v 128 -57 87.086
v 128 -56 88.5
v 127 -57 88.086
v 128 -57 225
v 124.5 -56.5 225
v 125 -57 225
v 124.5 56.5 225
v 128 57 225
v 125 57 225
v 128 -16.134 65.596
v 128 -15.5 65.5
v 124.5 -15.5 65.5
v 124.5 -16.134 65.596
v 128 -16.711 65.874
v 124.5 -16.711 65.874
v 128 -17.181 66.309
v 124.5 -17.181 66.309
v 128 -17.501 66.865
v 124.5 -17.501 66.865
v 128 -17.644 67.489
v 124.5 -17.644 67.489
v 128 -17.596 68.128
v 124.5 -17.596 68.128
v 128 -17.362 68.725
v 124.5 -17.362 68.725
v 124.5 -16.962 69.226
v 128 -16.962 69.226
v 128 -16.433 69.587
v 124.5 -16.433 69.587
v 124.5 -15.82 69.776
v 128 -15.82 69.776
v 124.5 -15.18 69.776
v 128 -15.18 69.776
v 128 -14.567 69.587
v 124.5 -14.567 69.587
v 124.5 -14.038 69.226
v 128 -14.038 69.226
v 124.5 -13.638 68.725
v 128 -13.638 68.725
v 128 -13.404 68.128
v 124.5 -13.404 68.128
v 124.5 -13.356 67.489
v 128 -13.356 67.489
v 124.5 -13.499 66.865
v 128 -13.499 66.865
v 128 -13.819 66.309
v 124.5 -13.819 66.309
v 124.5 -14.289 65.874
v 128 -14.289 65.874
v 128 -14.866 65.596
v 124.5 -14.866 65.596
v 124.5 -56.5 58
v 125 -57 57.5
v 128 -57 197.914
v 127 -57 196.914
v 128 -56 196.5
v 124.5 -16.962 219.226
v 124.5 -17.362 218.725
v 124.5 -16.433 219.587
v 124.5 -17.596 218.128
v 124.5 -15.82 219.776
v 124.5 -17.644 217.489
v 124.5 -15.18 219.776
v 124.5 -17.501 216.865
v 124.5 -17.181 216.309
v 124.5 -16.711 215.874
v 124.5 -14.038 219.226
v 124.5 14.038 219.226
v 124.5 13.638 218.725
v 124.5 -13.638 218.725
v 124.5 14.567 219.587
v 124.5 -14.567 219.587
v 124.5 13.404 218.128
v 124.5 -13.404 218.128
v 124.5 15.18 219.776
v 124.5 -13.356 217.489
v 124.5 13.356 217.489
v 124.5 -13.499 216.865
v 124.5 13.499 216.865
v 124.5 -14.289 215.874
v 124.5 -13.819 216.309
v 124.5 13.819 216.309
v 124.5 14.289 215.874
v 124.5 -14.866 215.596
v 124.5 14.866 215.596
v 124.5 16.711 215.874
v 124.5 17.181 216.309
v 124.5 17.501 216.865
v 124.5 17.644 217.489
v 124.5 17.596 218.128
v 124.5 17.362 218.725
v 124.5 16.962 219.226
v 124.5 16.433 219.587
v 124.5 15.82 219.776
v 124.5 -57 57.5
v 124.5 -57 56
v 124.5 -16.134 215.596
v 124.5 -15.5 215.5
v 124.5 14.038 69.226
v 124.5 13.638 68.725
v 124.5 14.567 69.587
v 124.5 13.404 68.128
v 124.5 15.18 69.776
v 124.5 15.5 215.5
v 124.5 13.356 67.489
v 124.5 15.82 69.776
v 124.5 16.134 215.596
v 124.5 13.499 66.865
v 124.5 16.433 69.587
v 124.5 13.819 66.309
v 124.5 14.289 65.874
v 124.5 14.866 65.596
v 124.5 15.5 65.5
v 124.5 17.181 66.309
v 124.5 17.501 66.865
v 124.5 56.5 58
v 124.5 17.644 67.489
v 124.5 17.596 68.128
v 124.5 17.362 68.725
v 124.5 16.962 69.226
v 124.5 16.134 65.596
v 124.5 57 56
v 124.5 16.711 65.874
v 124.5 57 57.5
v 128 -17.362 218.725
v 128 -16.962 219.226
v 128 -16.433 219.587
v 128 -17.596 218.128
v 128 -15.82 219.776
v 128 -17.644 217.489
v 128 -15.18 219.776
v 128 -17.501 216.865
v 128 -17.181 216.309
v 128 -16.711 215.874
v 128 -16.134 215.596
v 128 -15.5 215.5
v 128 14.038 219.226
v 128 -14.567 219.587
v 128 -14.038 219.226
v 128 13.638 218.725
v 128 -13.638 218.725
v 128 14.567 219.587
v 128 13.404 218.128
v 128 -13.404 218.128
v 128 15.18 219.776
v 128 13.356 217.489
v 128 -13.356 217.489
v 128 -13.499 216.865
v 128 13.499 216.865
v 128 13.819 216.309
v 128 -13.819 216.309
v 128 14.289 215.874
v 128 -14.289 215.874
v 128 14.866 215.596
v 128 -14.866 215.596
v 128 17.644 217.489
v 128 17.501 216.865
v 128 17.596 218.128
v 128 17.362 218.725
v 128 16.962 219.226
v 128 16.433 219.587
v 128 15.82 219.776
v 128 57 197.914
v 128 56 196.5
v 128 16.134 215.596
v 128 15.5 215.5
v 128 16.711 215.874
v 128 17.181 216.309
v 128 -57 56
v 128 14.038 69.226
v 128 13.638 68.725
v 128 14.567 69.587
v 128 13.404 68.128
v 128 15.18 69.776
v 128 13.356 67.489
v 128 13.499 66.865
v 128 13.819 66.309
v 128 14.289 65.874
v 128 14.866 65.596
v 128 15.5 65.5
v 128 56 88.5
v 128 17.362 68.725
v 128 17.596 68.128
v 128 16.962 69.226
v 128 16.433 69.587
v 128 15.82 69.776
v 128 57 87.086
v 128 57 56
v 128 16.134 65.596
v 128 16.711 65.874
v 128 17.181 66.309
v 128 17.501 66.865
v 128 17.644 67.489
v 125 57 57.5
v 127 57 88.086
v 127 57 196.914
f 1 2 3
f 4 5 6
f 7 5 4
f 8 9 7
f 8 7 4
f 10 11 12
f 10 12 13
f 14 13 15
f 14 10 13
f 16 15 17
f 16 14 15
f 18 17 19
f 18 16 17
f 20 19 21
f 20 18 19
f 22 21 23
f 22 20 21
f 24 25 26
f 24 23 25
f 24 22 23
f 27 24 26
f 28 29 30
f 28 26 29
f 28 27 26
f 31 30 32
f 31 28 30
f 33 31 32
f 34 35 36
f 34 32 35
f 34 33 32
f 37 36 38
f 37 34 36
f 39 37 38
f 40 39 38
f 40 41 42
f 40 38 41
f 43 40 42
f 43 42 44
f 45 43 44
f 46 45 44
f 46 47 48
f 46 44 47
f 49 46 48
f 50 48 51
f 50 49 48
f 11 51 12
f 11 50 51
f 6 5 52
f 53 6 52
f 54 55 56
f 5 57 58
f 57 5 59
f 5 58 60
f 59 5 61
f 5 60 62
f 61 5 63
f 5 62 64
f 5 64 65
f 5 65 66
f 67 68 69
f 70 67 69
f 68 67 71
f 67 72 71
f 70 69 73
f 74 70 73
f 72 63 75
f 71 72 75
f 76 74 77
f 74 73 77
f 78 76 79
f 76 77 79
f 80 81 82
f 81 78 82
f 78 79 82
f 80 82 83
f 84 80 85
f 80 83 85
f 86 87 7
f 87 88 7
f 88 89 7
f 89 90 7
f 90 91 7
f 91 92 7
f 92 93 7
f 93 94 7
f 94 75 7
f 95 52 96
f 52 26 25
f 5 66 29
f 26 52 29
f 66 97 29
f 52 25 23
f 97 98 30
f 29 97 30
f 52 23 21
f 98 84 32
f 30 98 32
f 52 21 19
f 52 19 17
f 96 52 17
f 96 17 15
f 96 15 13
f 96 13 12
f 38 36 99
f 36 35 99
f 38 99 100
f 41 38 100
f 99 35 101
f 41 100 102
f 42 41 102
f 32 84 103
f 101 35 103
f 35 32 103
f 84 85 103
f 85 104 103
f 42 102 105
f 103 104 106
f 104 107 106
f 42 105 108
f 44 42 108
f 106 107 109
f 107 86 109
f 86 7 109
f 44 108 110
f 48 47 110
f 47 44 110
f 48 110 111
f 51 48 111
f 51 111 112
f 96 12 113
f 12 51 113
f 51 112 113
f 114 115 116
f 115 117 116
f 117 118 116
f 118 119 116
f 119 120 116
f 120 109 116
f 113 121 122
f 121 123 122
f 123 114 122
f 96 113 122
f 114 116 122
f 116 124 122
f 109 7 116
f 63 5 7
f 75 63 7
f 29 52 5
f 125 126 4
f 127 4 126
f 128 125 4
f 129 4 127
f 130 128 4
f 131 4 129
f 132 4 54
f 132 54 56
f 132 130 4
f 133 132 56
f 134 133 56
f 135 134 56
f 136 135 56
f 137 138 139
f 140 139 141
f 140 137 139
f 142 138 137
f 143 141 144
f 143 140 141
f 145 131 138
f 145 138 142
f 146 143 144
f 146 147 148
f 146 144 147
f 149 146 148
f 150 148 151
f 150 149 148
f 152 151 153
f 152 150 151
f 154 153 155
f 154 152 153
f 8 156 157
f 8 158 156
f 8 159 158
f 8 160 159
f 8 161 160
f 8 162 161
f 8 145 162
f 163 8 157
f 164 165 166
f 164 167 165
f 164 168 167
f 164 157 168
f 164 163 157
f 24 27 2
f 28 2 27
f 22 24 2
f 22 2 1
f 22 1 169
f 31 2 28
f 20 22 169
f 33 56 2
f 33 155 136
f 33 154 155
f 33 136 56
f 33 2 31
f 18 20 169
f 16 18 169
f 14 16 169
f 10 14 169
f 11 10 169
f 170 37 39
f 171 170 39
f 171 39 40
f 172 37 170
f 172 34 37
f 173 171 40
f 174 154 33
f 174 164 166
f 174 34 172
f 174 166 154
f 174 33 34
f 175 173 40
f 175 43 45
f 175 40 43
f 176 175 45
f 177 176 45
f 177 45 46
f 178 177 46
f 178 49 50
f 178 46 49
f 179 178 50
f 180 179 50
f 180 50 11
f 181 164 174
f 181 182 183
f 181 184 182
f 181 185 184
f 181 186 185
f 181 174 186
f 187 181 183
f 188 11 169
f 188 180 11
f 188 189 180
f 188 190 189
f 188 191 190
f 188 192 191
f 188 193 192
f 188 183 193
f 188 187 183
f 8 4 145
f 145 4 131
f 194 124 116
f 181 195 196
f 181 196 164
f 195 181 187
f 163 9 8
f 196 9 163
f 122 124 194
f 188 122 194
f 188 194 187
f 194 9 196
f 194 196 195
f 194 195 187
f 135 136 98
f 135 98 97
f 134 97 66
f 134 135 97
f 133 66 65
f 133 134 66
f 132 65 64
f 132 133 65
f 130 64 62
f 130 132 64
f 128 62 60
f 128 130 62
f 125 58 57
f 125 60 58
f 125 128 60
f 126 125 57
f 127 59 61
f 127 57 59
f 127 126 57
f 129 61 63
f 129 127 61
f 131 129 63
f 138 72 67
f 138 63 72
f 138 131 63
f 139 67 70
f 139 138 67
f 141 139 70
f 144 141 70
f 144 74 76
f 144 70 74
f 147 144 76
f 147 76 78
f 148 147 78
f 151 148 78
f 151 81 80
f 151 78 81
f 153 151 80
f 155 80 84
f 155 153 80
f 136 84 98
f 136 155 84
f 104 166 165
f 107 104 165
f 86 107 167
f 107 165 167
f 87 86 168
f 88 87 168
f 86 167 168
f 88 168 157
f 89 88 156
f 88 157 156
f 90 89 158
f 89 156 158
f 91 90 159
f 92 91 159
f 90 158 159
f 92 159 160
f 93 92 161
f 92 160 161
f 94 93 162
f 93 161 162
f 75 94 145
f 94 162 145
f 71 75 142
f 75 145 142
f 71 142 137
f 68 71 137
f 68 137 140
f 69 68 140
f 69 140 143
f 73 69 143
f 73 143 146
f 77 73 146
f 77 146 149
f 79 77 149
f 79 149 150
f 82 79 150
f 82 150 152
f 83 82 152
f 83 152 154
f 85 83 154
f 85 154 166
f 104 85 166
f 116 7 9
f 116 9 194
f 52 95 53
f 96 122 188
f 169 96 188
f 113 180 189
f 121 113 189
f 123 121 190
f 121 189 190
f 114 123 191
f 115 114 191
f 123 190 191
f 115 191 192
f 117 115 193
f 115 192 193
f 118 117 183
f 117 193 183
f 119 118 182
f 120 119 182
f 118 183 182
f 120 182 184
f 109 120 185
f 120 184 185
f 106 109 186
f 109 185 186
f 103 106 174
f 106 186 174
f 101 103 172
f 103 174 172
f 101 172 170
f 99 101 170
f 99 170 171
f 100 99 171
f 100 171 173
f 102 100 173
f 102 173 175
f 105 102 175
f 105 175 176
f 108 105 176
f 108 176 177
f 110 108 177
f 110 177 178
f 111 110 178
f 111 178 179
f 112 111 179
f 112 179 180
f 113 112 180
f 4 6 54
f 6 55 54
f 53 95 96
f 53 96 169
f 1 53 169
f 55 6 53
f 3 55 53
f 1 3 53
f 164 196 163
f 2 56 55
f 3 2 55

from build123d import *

# Parameters (mm, degrees)
SKETCH1_W                = 134
SKETCH1_H                = 57
BOSS_EXTRUDE1_DEPTH      = 250
SKETCH2_W                = 115
SKETCH2_H                = 53.5
CUT_EXTRUDE1_DEPTH       = 246.5
SKETCH3_W                = 115
SKETCH3_H                = 194
CUT_EXTRUDE2_DEPTH       = 3.5
SKETCH4_W                = 6
SKETCH4_H                = 120
CUT_EXTRUDE3_DEPTH       = 290.318163965
CHAMFER1_SIZE            = 6
SKETCH5_R                = 2.15
CUT_EXTRUDE4_DEPTH       = 134
SKETCH6_W                = 25
SKETCH6_H                = 4.5
BOSS_EXTRUDE2_DEPTH      = 115
SKETCH7_R                = 3.65
CUT_EXTRUDE5_DEPTH       = 3.6
CUT_EXTRUDE6_START       = -3.6
SKETCH8_R                = 3.65
CUT_EXTRUDE6_DEPTH       = 3.6
CHAMFER1_OF_MIRROR1_SIZE = 6
SKETCH9_R                = 1.65
CUT_EXTRUDE7_DEPTH       = 25
CHAMFER3_SIZE            = 0.5
CUT_EXTRUDE9_DEPTH       = 306.69919856
CHAMFER4_SIZE            = 0.5
SKETCH12_W               = 0.5
SKETCH12_H               = 2
BOSS_EXTRUDE3_DEPTH      = 114
CHAMFER5_SIZE            = 0.5


# Some blends are built 0.0001 mm under size
with BuildPart() as part:
    # Sketch1 → Boss-Extrude1 (new body)
    with BuildSketch(Plane.XY):
        with Locations((67, 28.5)):
            Rectangle(SKETCH1_W, SKETCH1_H)
    boss_extrude1 = extrude(amount=BOSS_EXTRUDE1_DEPTH)

    # Sketch2 → Cut-Extrude1 (cut)
    with BuildSketch(Plane.XY.offset(250)):
        with Locations((67, 26.75)):
            Rectangle(SKETCH2_W, SKETCH2_H)
    cut_extrude1 = extrude(amount=-CUT_EXTRUDE1_DEPTH, mode=Mode.SUBTRACT)

    # Sketch3 → Cut-Extrude2 (cut)
    with BuildSketch(Plane(origin=(0, 57, 0), x_dir=(1, 0, 0), z_dir=(0, 1, 0))):
        with Locations((67, -153)):
            Rectangle(SKETCH3_W, SKETCH3_H)
    cut_extrude2 = extrude(amount=-CUT_EXTRUDE2_DEPTH, mode=Mode.SUBTRACT)

    # Sketch4 → Cut-Extrude3 (cut, through all)
    with BuildSketch(Plane.XZ):
        with Locations((3, 142.5)):
            Rectangle(SKETCH4_W, SKETCH4_H)
        with Locations((131, 142.5)):
            Rectangle(SKETCH4_W, SKETCH4_H)
    cut_extrude3 = extrude(amount=-CUT_EXTRUDE3_DEPTH, mode=Mode.SUBTRACT)

    # Chamfer1
    chamfer1_edges = [part.edges().sort_by_distance(p)[0] for p in [
        (6, 28.5, 202.5),
        (6, 28.5, 82.5),
        (128, 28.5, 82.5),
        (128, 28.5, 202.5),
    ]]
    chamfer(chamfer1_edges, length=CHAMFER1_SIZE - 0.0001)  # a hair under: the kernel refuses the full size

    # Sketch5 → Cut-Extrude4 (cut)
    with BuildSketch(Plane(origin=(134, 0, 0), x_dir=(0, 0, -1), z_dir=(1, 0, 0))):
        with Locations((-217.65, 15.5)):
            Circle(SKETCH5_R)
        with Locations((-67.65, 15.5)):
            Circle(SKETCH5_R)
    cut_extrude4 = extrude(amount=-CUT_EXTRUDE4_DEPTH, mode=Mode.SUBTRACT)

    # Sketch6 → Boss-Extrude2 (add)
    with BuildSketch(Plane(origin=(9.5, 0, 0), x_dir=(0, 0, -1), z_dir=(1, 0, 0))):
        with Locations((-237.5, 2.25)):
            Rectangle(SKETCH6_W, SKETCH6_H)
    boss_extrude2 = extrude(amount=BOSS_EXTRUDE2_DEPTH)

    # Sketch7 → Cut-Extrude5 (cut)
    with BuildSketch(Plane(origin=(134, 0, 0), x_dir=(0, 0, -1), z_dir=(1, 0, 0))):
        with Locations((-217.65, 15.5)):
            Circle(SKETCH7_R)
        with Locations((-67.65, 15.5)):
            Circle(SKETCH7_R)
    cut_extrude5 = extrude(amount=-CUT_EXTRUDE5_DEPTH, mode=Mode.SUBTRACT)

    # Sketch8 → Cut-Extrude6 (cut)
    with BuildSketch(Plane.ZY.offset(CUT_EXTRUDE6_START)):
        with Locations(Location((217.65, 15.5, 0), (0, 0, 180))):
            Circle(SKETCH8_R)
        with Locations(Location((67.65, 15.5, 0), (0, 0, 180))):
            Circle(SKETCH8_R)
    cut_extrude6 = extrude(amount=CUT_EXTRUDE6_DEPTH, mode=Mode.SUBTRACT)


with BuildPart() as mirror1_1:
    # Mirror1: Boss-Extrude1 across plane
    add(boss_extrude1.mirror(Plane.ZX))

    # Mirror1 2: Cut-Extrude1, Cut-Extrude2, Cut-Extrude3, Cut-Extrude4 across plane
    add(cut_extrude1.mirror(Plane.ZX), mode=Mode.SUBTRACT)
    add(cut_extrude2.mirror(Plane.ZX), mode=Mode.SUBTRACT)
    add(cut_extrude3.mirror(Plane.ZX), mode=Mode.SUBTRACT)
    add(cut_extrude4.mirror(Plane.ZX), mode=Mode.SUBTRACT)

    # Mirror1 4: Cut-Extrude5, Cut-Extrude6 across plane
    add(cut_extrude5.mirror(Plane.ZX), mode=Mode.SUBTRACT)
    add(cut_extrude6.mirror(Plane.ZX), mode=Mode.SUBTRACT)

    # Chamfer1 of Mirror1
    chamfer1_of_mirror1_edges = [mirror1_1.edges().sort_by_distance(p)[0] for p in [
        (6, -28.5, 202.5),
        (6, -28.5, 82.5),
        (128, -28.5, 82.5),
        (128, -28.5, 202.5),
    ]]
    chamfer(chamfer1_of_mirror1_edges, length=CHAMFER1_OF_MIRROR1_SIZE - 0.0001)  # a hair under: the kernel refuses the full size


with BuildPart() as mirror1_3_1:
    # Mirror1 3: Boss-Extrude2 across plane
    add(boss_extrude2.mirror(Plane.ZX))


with BuildPart() as part_1:
    add(part.part)

    # Mirror1 united with what the copies touc: union Mirror1_1, Mirror1 3_1
    add(mirror1_1.part)
    add(mirror1_3_1.part)

    # Sketch9 → Cut-Extrude7 (cut)
    with BuildSketch(Plane.XY.offset(250)):
        with Locations((25, 0)):
            Circle(SKETCH9_R)
        with Locations((109, 0)):
            Circle(SKETCH9_R)
    extrude(amount=-CUT_EXTRUDE7_DEPTH, mode=Mode.SUBTRACT)

    # Chamfer2
    # the kernel refuses this chamfer: 1 mm, written as the material it takes off along each edge
    with BuildSketch(Plane(origin=(133.333333333, -56.333333333, 0.666666667), x_dir=(-0.7071067811865475, -0.7071067811865475, 0), z_dir=(0.5773502691896257, -0.5773502691896258, -0.5773502691896258))) as chamfer2_piece_1:
        Polygon((-0.707106781, -0.40824829), (0.707106781, -0.40824829), (0, 0.816496581), align=None)
    extrude(amount=1.270170592, mode=Mode.SUBTRACT)
    with BuildSketch(Plane(origin=(0.666666667, -56.333333333, 0.666666667), x_dir=(0.7071067811865475, -0.7071067811865475, 0), z_dir=(-0.5773502691896258, -0.5773502691896258, -0.5773502691896258)), Plane(origin=(133.333333333, 56.333333333, 0.666666667), x_dir=(-0.7071067811865475, 0.7071067811865475, 0), z_dir=(0.5773502691896257, 0.5773502691896258, -0.5773502691896258)), Plane(origin=(0.666666667, 56.333333333, 0.666666667), x_dir=(-0.7071067811865475, -0.7071067811865475, 0), z_dir=(-0.5773502691896257, 0.5773502691896258, -0.5773502691896257))) as chamfer2_piece_2:
        Polygon((-0.707106781, 0.40824829), (0.707106781, 0.40824829), (0, -0.816496581), align=None)
    extrude(amount=1.270170592, mode=Mode.SUBTRACT)
    with BuildSketch(Plane(origin=(0, -57, 199.928317012), x_dir=(0.9996219169112968, -0.02749587661058908, 0), z_dir=(0, 0, 1)), Plane(origin=(134, 57, 199.928317012), x_dir=(-0.9996219169112968, 0.027495876610589196, 0), z_dir=(0, 0, 1))) as chamfer2_piece_3:
        with BuildLine():
            Line((1.028673195, 0), (-0.056547155, 1.027117794))
            Line((-0.056547155, 1.027117794), (-0.076539593, 1.026567876))
            ThreePointArc((-0.076539593, 1.026567876), (-0.034129227, 0.51339783), (-0.019992438, -0.000549918))
            Line((-0.019992438, -0.000549918), (0.000549918, -0.019992438))
            ThreePointArc((0.000549918, -0.019992438), (0.514497665, -0.00585565), (1.029223113, -0.019992438))
            Line((1.029223113, -0.019992438), (1.028673195, 0))
        make_face()
    extrude(amount=52.643365976, mode=Mode.SUBTRACT)
    with BuildSketch(Plane(origin=(134, -57, 199.928317012), x_dir=(-0.9996219169112968, -0.027495876610589196, 0), z_dir=(0, 0, 1)), Plane(origin=(0, 57, 199.928317012), x_dir=(0.9996219169112968, 0.02749587661058908, 0), z_dir=(0, 0, 1))) as chamfer2_piece_4:
        with BuildLine():
            Line((1.028673195, 0), (-0.056547155, -1.027117794))
            Line((-0.056547155, -1.027117794), (-0.076539593, -1.026567876))
            ThreePointArc((-0.076539593, -1.026567876), (-0.034129227, -0.51339783), (-0.019992438, 0.000549918))
            Line((-0.019992438, 0.000549918), (0.000549918, 0.019992438))
            ThreePointArc((0.000549918, 0.019992438), (0.514497665, 0.00585565), (1.029223113, 0.019992438))
            Line((1.029223113, 0.019992438), (1.028673195, 0))
        make_face()
    extrude(amount=52.643365976, mode=Mode.SUBTRACT)
    with BuildSketch(Plane(origin=(136.571682988, -57, 0), x_dir=(0, -0.02749587661058908, 0.9996219169112968), z_dir=(-1, 0, 0))) as chamfer2_piece_5:
        with BuildLine():
            Line((1.028673195, 0), (-0.056547155, 1.027117794))
            Line((-0.056547155, 1.027117794), (-0.076539593, 1.026567876))
            ThreePointArc((-0.076539593, 1.026567876), (-0.034129227, 0.51339783), (-0.019992438, -0.000549918))
            Line((-0.019992438, -0.000549918), (0.000549918, -0.019992438))
            ThreePointArc((0.000549918, -0.019992438), (0.514497665, -0.00585565), (1.029223113, -0.019992438))
            Line((1.029223113, -0.019992438), (1.028673195, 0))
        make_face()
    extrude(amount=139.143365976, mode=Mode.SUBTRACT)
    with BuildSketch(Plane(origin=(134, -57, -2.571682988), x_dir=(0.027495876610582105, 0.999621916911297, 0), z_dir=(0, 0, 1)), Plane(origin=(0, -57, -2.571682988), x_dir=(0.9996219169112968, -0.02749587661058908, 0), z_dir=(0, 0, 1))) as chamfer2_piece_6:
        with BuildLine():
            Line((1.028673195, 0), (-0.056547155, 1.027117794))
            Line((-0.056547155, 1.027117794), (-0.076539593, 1.026567876))
            ThreePointArc((-0.076539593, 1.026567876), (-0.034129227, 0.51339783), (-0.019992438, -0.000549918))
            Line((-0.019992438, -0.000549918), (0.000549918, -0.019992438))
            ThreePointArc((0.000549918, -0.019992438), (0.514497665, -0.00585565), (1.029223113, -0.019992438))
            Line((1.029223113, -0.019992438), (1.028673195, 0))
        make_face()
    extrude(amount=87.643365976, mode=Mode.SUBTRACT)
    with BuildSketch(Plane(origin=(6, -57, 85.928217012), x_dir=(0.9996219169112968, -0.027495876610589075, 0), z_dir=(0, 0, 1))) as chamfer2_piece_7_section:
        with BuildLine():
            Line((1.028673195, 0), (-0.056547155, 1.027117794))
            Line((-0.056547155, 1.027117794), (-0.076539593, 1.026567876))
            ThreePointArc((-0.076539593, 1.026567876), (-0.034129227, 0.51339783), (-0.019992438, -0.000549918))
            Line((-0.019992438, -0.000549918), (0.000549918, -0.019992438))
            ThreePointArc((0.000549918, -0.019992438), (0.514497665, -0.00585565), (1.029223113, -0.019992438))
            Line((1.029223113, -0.019992438), (1.028673195, 0))
        make_face()
    chamfer2_piece_7 = extrude(amount=113.143565976, mode=Mode.PRIVATE)
    chamfer2_piece_7 = split(chamfer2_piece_7, bisect_by=Plane(origin=(33.164355215, -56.669573831, 115.664255215), z_dir=(-0.7071067811865475, 0, 0.7071067811865477)), keep=Keep.TOP, mode=Mode.PRIVATE)
    chamfer2_piece_7 = split(chamfer2_piece_7, bisect_by=Plane(origin=(33.164355215, -56.669573831, 169.335744785), z_dir=(-0.7071067811865472, 0, -0.7071067811865478)), keep=Keep.TOP, mode=Mode.PRIVATE)
    add(chamfer2_piece_7, mode=Mode.SUBTRACT)
    with BuildSketch(Plane(origin=(128, -57, 85.928217012), x_dir=(0.027495876610582105, 0.999621916911297, 0), z_dir=(0, 0, 1))) as chamfer2_piece_8_section:
        with BuildLine():
            Line((1.028673195, 0), (-0.056547155, 1.027117794))
            Line((-0.056547155, 1.027117794), (-0.076539593, 1.026567876))
            ThreePointArc((-0.076539593, 1.026567876), (-0.034129227, 0.51339783), (-0.019992438, -0.000549918))
            Line((-0.019992438, -0.000549918), (0.000549918, -0.019992438))
            ThreePointArc((0.000549918, -0.019992438), (0.514497665, -0.00585565), (1.029223113, -0.019992438))
            Line((1.029223113, -0.019992438), (1.028673195, 0))
        make_face()
    chamfer2_piece_8 = extrude(amount=113.143565976, mode=Mode.PRIVATE)
    chamfer2_piece_8 = split(chamfer2_piece_8, bisect_by=Plane(origin=(100.835644785, -56.669573831, 115.664255215), z_dir=(0.7071067811865476, 0, 0.7071067811865476)), keep=Keep.TOP, mode=Mode.PRIVATE)
    chamfer2_piece_8 = split(chamfer2_piece_8, bisect_by=Plane(origin=(100.835644785, -56.669573831, 169.335744785), z_dir=(0.7071067811865476, 0, -0.7071067811865476)), keep=Keep.TOP, mode=Mode.PRIVATE)
    add(chamfer2_piece_8, mode=Mode.SUBTRACT)
    with BuildSketch(Plane(origin=(-1.81835448, -57, 204.31845448), x_dir=(0.7068394360706731, -0.027495876610588672, 0.7068394360706738), z_dir=(0.7071067811865479, 0, -0.7071067811865474))) as chamfer2_piece_9_section:
        with BuildLine():
            Line((1.028673195, 0), (-0.056547155, -1.027117794))
            Line((-0.056547155, -1.027117794), (-0.076539593, -1.026567876))
            ThreePointArc((-0.076539593, -1.026567876), (-0.034129227, -0.51339783), (-0.019992438, 0.000549918))
            Line((-0.019992438, 0.000549918), (0.000549918, 0.019992438))
            ThreePointArc((0.000549918, 0.019992438), (0.514497665, 0.00585565), (1.029223113, 0.019992438))
            Line((1.029223113, 0.019992438), (1.028673195, 0))
        make_face()
    chamfer2_piece_9 = extrude(amount=13.628505929, mode=Mode.PRIVATE)
    chamfer2_piece_9 = split(chamfer2_piece_9, bisect_by=Plane(origin=(6, -56.681906875, 203.533564865), z_dir=(-1, 0, 0)), keep=Keep.TOP, mode=Mode.PRIVATE)
    add(chamfer2_piece_9, mode=Mode.SUBTRACT)
    with BuildSketch(Plane(origin=(7.81845448, -57, 90.31835448), x_dir=(0.7068394360706733, -0.027495876610588946, -0.7068394360706736), z_dir=(-0.7071067811865477, 0, -0.7071067811865475))) as chamfer2_piece_10_section:
        with BuildLine():
            Line((1.028673195, 0), (-0.056547155, -1.027117794))
            Line((-0.056547155, -1.027117794), (-0.076539593, -1.026567876))
            ThreePointArc((-0.076539593, -1.026567876), (-0.034129227, -0.51339783), (-0.019992438, 0.000549918))
            Line((-0.019992438, 0.000549918), (0.000549918, 0.019992438))
            ThreePointArc((0.000549918, 0.019992438), (0.514497665, 0.00585565), (1.029223113, 0.019992438))
            Line((1.029223113, 0.019992438), (1.028673195, 0))
        make_face()
    chamfer2_piece_10 = extrude(amount=13.628505929, mode=Mode.PRIVATE)
    chamfer2_piece_10 = split(chamfer2_piece_10, bisect_by=Plane(origin=(6, -56.661529994, 85.278226705), z_dir=(-1, 0, 0)), keep=Keep.TOP, mode=Mode.PRIVATE)
    add(chamfer2_piece_10, mode=Mode.SUBTRACT)
    with BuildSketch(Plane(origin=(135.81835448, -57, 80.68154552), x_dir=(0.01944252080601719, 0.9996219169112965, 0.01944252080601719), z_dir=(-0.7071067811865476, 0, 0.7071067811865476))) as chamfer2_piece_11_section:
        with BuildLine():
            Line((1.028673195, 0), (-0.056547155, 1.027117794))
            Line((-0.056547155, 1.027117794), (-0.076539593, 1.026567876))
            ThreePointArc((-0.076539593, 1.026567876), (-0.034129227, 0.51339783), (-0.019992438, -0.000549918))
            Line((-0.019992438, -0.000549918), (0.000549918, -0.019992438))
            ThreePointArc((0.000549918, -0.019992438), (0.514497665, -0.00585565), (1.029223113, -0.019992438))
            Line((1.029223113, -0.019992438), (1.028673195, 0))
        make_face()
    chamfer2_piece_11 = extrude(amount=13.628505929, mode=Mode.PRIVATE)
    chamfer2_piece_11 = split(chamfer2_piece_11, bisect_by=Plane(origin=(128, -56.681906875, 81.466435135), z_dir=(1, 0, 0)), keep=Keep.TOP, mode=Mode.PRIVATE)
    add(chamfer2_piece_11, mode=Mode.SUBTRACT)
    with BuildSketch(Plane(origin=(126.18154552, -57, 194.68164552), x_dir=(-0.7068394360706735, -0.027495876610588745, 0.7068394360706735), z_dir=(0.7071067811865476, 0, 0.7071067811865476))) as chamfer2_piece_12_section:
        with BuildLine():
            Line((1.028673195, 0), (-0.056547155, -1.027117794))
            Line((-0.056547155, -1.027117794), (-0.076539593, -1.026567876))
            ThreePointArc((-0.076539593, -1.026567876), (-0.034129227, -0.51339783), (-0.019992438, 0.000549918))
            Line((-0.019992438, 0.000549918), (0.000549918, 0.019992438))
            ThreePointArc((0.000549918, 0.019992438), (0.514497665, 0.00585565), (1.029223113, 0.019992438))
            Line((1.029223113, 0.019992438), (1.028673195, 0))
        make_face()
    chamfer2_piece_12 = extrude(amount=13.628505929, mode=Mode.PRIVATE)
    chamfer2_piece_12 = split(chamfer2_piece_12, bisect_by=Plane(origin=(128, -56.661529994, 199.721773295), z_dir=(1, 0, 0)), keep=Keep.TOP, mode=Mode.PRIVATE)
    add(chamfer2_piece_12, mode=Mode.SUBTRACT)
    with BuildSketch(Plane(origin=(134, 57, -2.571682988), x_dir=(0.027495876610582105, -0.999621916911297, 0), z_dir=(0, 0, 1)), Plane(origin=(0, 57, -2.571682988), x_dir=(0.9996219169112968, 0.02749587661058908, 0), z_dir=(0, 0, 1))) as chamfer2_piece_13:
        with BuildLine():
            Line((1.028673195, 0), (-0.056547155, -1.027117794))
            Line((-0.056547155, -1.027117794), (-0.076539593, -1.026567876))
            ThreePointArc((-0.076539593, -1.026567876), (-0.034129227, -0.51339783), (-0.019992438, 0.000549918))
            Line((-0.019992438, 0.000549918), (0.000549918, 0.019992438))
            ThreePointArc((0.000549918, 0.019992438), (0.514497665, 0.00585565), (1.029223113, 0.019992438))
            Line((1.029223113, 0.019992438), (1.028673195, 0))
        make_face()
    extrude(amount=87.643365976, mode=Mode.SUBTRACT)
    with BuildSketch(Plane(origin=(136.571682988, 57, 0), x_dir=(0, 0.02749587661058908, 0.9996219169112968), z_dir=(-1, 0, 0))) as chamfer2_piece_14:
        with BuildLine():
            Line((1.028673195, 0), (-0.056547155, -1.027117794))
            Line((-0.056547155, -1.027117794), (-0.076539593, -1.026567876))
            ThreePointArc((-0.076539593, -1.026567876), (-0.034129227, -0.51339783), (-0.019992438, 0.000549918))
            Line((-0.019992438, 0.000549918), (0.000549918, 0.019992438))
            ThreePointArc((0.000549918, 0.019992438), (0.514497665, 0.00585565), (1.029223113, 0.019992438))
            Line((1.029223113, 0.019992438), (1.028673195, 0))
        make_face()
    extrude(amount=139.143365976, mode=Mode.SUBTRACT)
    with BuildSketch(Plane(origin=(134, -59.571682988, 0), x_dir=(0.027495876610582174, 0, 0.9996219169112968), z_dir=(0, 1, 0)), Plane(origin=(0, -59.571682988, 0), x_dir=(0.9996219169112968, 0, -0.027495876610586372), z_dir=(0, 1, 0))) as chamfer2_piece_15:
        with BuildLine():
            Line((1.028673195, 0), (-0.056547155, -1.027117794))
            Line((-0.056547155, -1.027117794), (-0.076539593, -1.026567876))
            ThreePointArc((-0.076539593, -1.026567876), (-0.034129227, -0.51339783), (-0.019992438, 0.000549918))
            Line((-0.019992438, 0.000549918), (0.000549918, 0.019992438))
            ThreePointArc((0.000549918, 0.019992438), (0.514497665, 0.00585565), (1.029223113, 0.019992438))
            Line((1.029223113, 0.019992438), (1.028673195, 0))
        make_face()
    extrude(amount=119.143365976, mode=Mode.SUBTRACT)
    with BuildSketch(Plane(origin=(6, 57, 199.071782988), x_dir=(0.9996219169112968, 0.027495876610589075, 0), z_dir=(0, 0, -1))) as chamfer2_piece_16_section:
        with BuildLine():
            Line((1.028673195, 0), (-0.056547155, 1.027117794))
            Line((-0.056547155, 1.027117794), (-0.076539593, 1.026567876))
            ThreePointArc((-0.076539593, 1.026567876), (-0.034129227, 0.51339783), (-0.019992438, -0.000549918))
            Line((-0.019992438, -0.000549918), (0.000549918, -0.019992438))
            ThreePointArc((0.000549918, -0.019992438), (0.514497665, -0.00585565), (1.029223113, -0.019992438))
            Line((1.029223113, -0.019992438), (1.028673195, 0))
        make_face()
    chamfer2_piece_16 = extrude(amount=113.143565976, mode=Mode.PRIVATE)
    chamfer2_piece_16 = split(chamfer2_piece_16, bisect_by=Plane(origin=(33.164355215, 56.669573831, 115.664255215), z_dir=(-0.7071067811865475, 0, 0.7071067811865477)), keep=Keep.TOP, mode=Mode.PRIVATE)
    chamfer2_piece_16 = split(chamfer2_piece_16, bisect_by=Plane(origin=(33.164355215, 56.669573831, 169.335744785), z_dir=(-0.7071067811865472, 0, -0.7071067811865478)), keep=Keep.TOP, mode=Mode.PRIVATE)
    add(chamfer2_piece_16, mode=Mode.SUBTRACT)
    with BuildSketch(Plane(origin=(128, 57, 199.071782988), x_dir=(-0.9996219169112968, 0.027495876610589196, 0), z_dir=(0, 0, -1))) as chamfer2_piece_17_section:
        with BuildLine():
            Line((1.028673195, 0), (-0.056547155, -1.027117794))
            Line((-0.056547155, -1.027117794), (-0.076539593, -1.026567876))
            ThreePointArc((-0.076539593, -1.026567876), (-0.034129227, -0.51339783), (-0.019992438, 0.000549918))
            Line((-0.019992438, 0.000549918), (0.000549918, 0.019992438))
            ThreePointArc((0.000549918, 0.019992438), (0.514497665, 0.00585565), (1.029223113, 0.019992438))
            Line((1.029223113, 0.019992438), (1.028673195, 0))
        make_face()
    chamfer2_piece_17 = extrude(amount=113.143565976, mode=Mode.PRIVATE)
    chamfer2_piece_17 = split(chamfer2_piece_17, bisect_by=Plane(origin=(100.835644785, 56.669573831, 115.664255215), z_dir=(0.7071067811865476, 0, 0.7071067811865476)), keep=Keep.TOP, mode=Mode.PRIVATE)
    chamfer2_piece_17 = split(chamfer2_piece_17, bisect_by=Plane(origin=(100.835644785, 56.669573831, 169.335744785), z_dir=(0.7071067811865476, 0, -0.7071067811865476)), keep=Keep.TOP, mode=Mode.PRIVATE)
    add(chamfer2_piece_17, mode=Mode.SUBTRACT)
    with BuildSketch(Plane(origin=(-1.81835448, 57, 204.31845448), x_dir=(0.7068394360706731, 0.027495876610588672, 0.7068394360706738), z_dir=(0.7071067811865479, 0, -0.7071067811865474))) as chamfer2_piece_18_section:
        with BuildLine():
            Line((1.028673195, 0), (-0.056547155, 1.027117794))
            Line((-0.056547155, 1.027117794), (-0.076539593, 1.026567876))
            ThreePointArc((-0.076539593, 1.026567876), (-0.034129227, 0.51339783), (-0.019992438, -0.000549918))
            Line((-0.019992438, -0.000549918), (0.000549918, -0.019992438))
            ThreePointArc((0.000549918, -0.019992438), (0.514497665, -0.00585565), (1.029223113, -0.019992438))
            Line((1.029223113, -0.019992438), (1.028673195, 0))
        make_face()
    chamfer2_piece_18 = extrude(amount=13.628505929, mode=Mode.PRIVATE)
    chamfer2_piece_18 = split(chamfer2_piece_18, bisect_by=Plane(origin=(6, 56.681906875, 203.533564865), z_dir=(-1, 0, 0)), keep=Keep.TOP, mode=Mode.PRIVATE)
    add(chamfer2_piece_18, mode=Mode.SUBTRACT)
    with BuildSketch(Plane(origin=(7.81845448, 57, 90.31835448), x_dir=(0.7068394360706733, 0.027495876610588946, -0.7068394360706736), z_dir=(-0.7071067811865477, 0, -0.7071067811865475))) as chamfer2_piece_19_section:
        with BuildLine():
            Line((1.028673195, 0), (-0.056547155, 1.027117794))
            Line((-0.056547155, 1.027117794), (-0.076539593, 1.026567876))
            ThreePointArc((-0.076539593, 1.026567876), (-0.034129227, 0.51339783), (-0.019992438, -0.000549918))
            Line((-0.019992438, -0.000549918), (0.000549918, -0.019992438))
            ThreePointArc((0.000549918, -0.019992438), (0.514497665, -0.00585565), (1.029223113, -0.019992438))
            Line((1.029223113, -0.019992438), (1.028673195, 0))
        make_face()
    chamfer2_piece_19 = extrude(amount=13.628505929, mode=Mode.PRIVATE)
    chamfer2_piece_19 = split(chamfer2_piece_19, bisect_by=Plane(origin=(6, 56.661529994, 85.278226705), z_dir=(-1, 0, 0)), keep=Keep.TOP, mode=Mode.PRIVATE)
    add(chamfer2_piece_19, mode=Mode.SUBTRACT)
    with BuildSketch(Plane(origin=(135.81835448, 57, 80.68154552), x_dir=(0.01944252080601719, -0.9996219169112965, 0.01944252080601719), z_dir=(-0.7071067811865476, 0, 0.7071067811865476))) as chamfer2_piece_20_section:
        with BuildLine():
            Line((1.028673195, 0), (-0.056547155, -1.027117794))
            Line((-0.056547155, -1.027117794), (-0.076539593, -1.026567876))
            ThreePointArc((-0.076539593, -1.026567876), (-0.034129227, -0.51339783), (-0.019992438, 0.000549918))
            Line((-0.019992438, 0.000549918), (0.000549918, 0.019992438))
            ThreePointArc((0.000549918, 0.019992438), (0.514497665, 0.00585565), (1.029223113, 0.019992438))
            Line((1.029223113, 0.019992438), (1.028673195, 0))
        make_face()
    chamfer2_piece_20 = extrude(amount=13.628505929, mode=Mode.PRIVATE)
    chamfer2_piece_20 = split(chamfer2_piece_20, bisect_by=Plane(origin=(128, 56.681906875, 81.466435135), z_dir=(1, 0, 0)), keep=Keep.TOP, mode=Mode.PRIVATE)
    add(chamfer2_piece_20, mode=Mode.SUBTRACT)
    with BuildSketch(Plane(origin=(126.18154552, 57, 194.68164552), x_dir=(-0.7068394360706735, 0.027495876610588745, 0.7068394360706735), z_dir=(0.7071067811865476, 0, 0.7071067811865476))) as chamfer2_piece_21_section:
        with BuildLine():
            Line((1.028673195, 0), (-0.056547155, 1.027117794))
            Line((-0.056547155, 1.027117794), (-0.076539593, 1.026567876))
            ThreePointArc((-0.076539593, 1.026567876), (-0.034129227, 0.51339783), (-0.019992438, -0.000549918))
            Line((-0.019992438, -0.000549918), (0.000549918, -0.019992438))
            ThreePointArc((0.000549918, -0.019992438), (0.514497665, -0.00585565), (1.029223113, -0.019992438))
            Line((1.029223113, -0.019992438), (1.028673195, 0))
        make_face()
    chamfer2_piece_21 = extrude(amount=13.628505929, mode=Mode.PRIVATE)
    chamfer2_piece_21 = split(chamfer2_piece_21, bisect_by=Plane(origin=(128, 56.661529994, 199.721773295), z_dir=(1, 0, 0)), keep=Keep.TOP, mode=Mode.PRIVATE)
    add(chamfer2_piece_21, mode=Mode.SUBTRACT)
    with BuildSketch(Plane(origin=(7.81845448, -57, 90.31835448), x_dir=(0.7068394360706733, -0.027495876610588946, -0.7068394360706736), z_dir=(-0.7071067811865477, 0, -0.7071067811865475))) as chamfer2_piece_22a_section:
        with BuildLine():
            Line((1.028673195, 0), (-0.056547155, -1.027117794))
            Line((-0.056547155, -1.027117794), (-0.076539593, -1.026567876))
            ThreePointArc((-0.076539593, -1.026567876), (-0.034129227, -0.51339783), (-0.019992438, 0.000549918))
            Line((-0.019992438, 0.000549918), (0.000549918, 0.019992438))
            ThreePointArc((0.000549918, 0.019992438), (0.514497665, 0.00585565), (1.029223113, 0.019992438))
            Line((1.029223113, 0.019992438), (1.028673195, 0))
        make_face()
    chamfer2_piece_22a = extrude(amount=13.628505929, mode=Mode.PRIVATE)
    chamfer2_piece_22a = split(chamfer2_piece_22a, bisect_by=Plane(origin=(6, -56.681906875, 89.036114365), z_dir=(1, 0, 0)), keep=Keep.TOP, mode=Mode.PRIVATE)
    with BuildSketch(Plane(origin=(6, -57, 85.928217012), x_dir=(0.9996219169112968, -0.027495876610589075, 0), z_dir=(0, 0, 1))) as chamfer2_piece_22b_section:
        with BuildLine():
            Line((1.028673195, 0), (-0.056547155, 1.027117794))
            Line((-0.056547155, 1.027117794), (-0.076539593, 1.026567876))
            ThreePointArc((-0.076539593, 1.026567876), (-0.034129227, 0.51339783), (-0.019992438, -0.000549918))
            Line((-0.019992438, -0.000549918), (0.000549918, -0.019992438))
            ThreePointArc((0.000549918, -0.019992438), (0.514497665, -0.00585565), (1.029223113, -0.019992438))
            Line((1.029223113, -0.019992438), (1.028673195, 0))
        make_face()
    chamfer2_piece_22b = extrude(amount=113.143565976, mode=Mode.PRIVATE)
    chamfer2_piece_22b = split(chamfer2_piece_22b, bisect_by=Plane(origin=(5.620839187, -56.681906875, 88.120739187), z_dir=(0.7071067811865475, 0, -0.7071067811865477)), keep=Keep.TOP, mode=Mode.PRIVATE)
    chamfer2_piece_22 = chamfer2_piece_22a & chamfer2_piece_22b
    add(chamfer2_piece_22, mode=Mode.SUBTRACT)
    with BuildSketch(Plane(origin=(6, -57, 85.928217012), x_dir=(0.9996219169112968, -0.027495876610589075, 0), z_dir=(0, 0, 1))) as chamfer2_piece_23a_section:
        with BuildLine():
            Line((1.028673195, 0), (-0.056547155, 1.027117794))
            Line((-0.056547155, 1.027117794), (-0.076539593, 1.026567876))
            ThreePointArc((-0.076539593, 1.026567876), (-0.034129227, 0.51339783), (-0.019992438, -0.000549918))
            Line((-0.019992438, -0.000549918), (0.000549918, -0.019992438))
            ThreePointArc((0.000549918, -0.019992438), (0.514497665, -0.00585565), (1.029223113, -0.019992438))
            Line((1.029223113, -0.019992438), (1.028673195, 0))
        make_face()
    chamfer2_piece_23a = extrude(amount=113.143565976, mode=Mode.PRIVATE)
    chamfer2_piece_23a = split(chamfer2_piece_23a, bisect_by=Plane(origin=(5.620839187, -56.681906875, 196.879260813), z_dir=(0.7071067811865472, 0, 0.7071067811865478)), keep=Keep.TOP, mode=Mode.PRIVATE)
    with BuildSketch(Plane(origin=(-1.81835448, -57, 204.31845448), x_dir=(0.7068394360706731, -0.027495876610588672, 0.7068394360706738), z_dir=(0.7071067811865479, 0, -0.7071067811865474))) as chamfer2_piece_23b_section:
        with BuildLine():
            Line((1.028673195, 0), (-0.056547155, -1.027117794))
            Line((-0.056547155, -1.027117794), (-0.076539593, -1.026567876))
            ThreePointArc((-0.076539593, -1.026567876), (-0.034129227, -0.51339783), (-0.019992438, 0.000549918))
            Line((-0.019992438, 0.000549918), (0.000549918, 0.019992438))
            ThreePointArc((0.000549918, 0.019992438), (0.514497665, 0.00585565), (1.029223113, 0.019992438))
            Line((1.029223113, 0.019992438), (1.028673195, 0))
        make_face()
    chamfer2_piece_23b = extrude(amount=13.628505929, mode=Mode.PRIVATE)
    chamfer2_piece_23b = split(chamfer2_piece_23b, bisect_by=Plane(origin=(6, -56.681906875, 195.963885635), z_dir=(1, 0, 0)), keep=Keep.TOP, mode=Mode.PRIVATE)
    chamfer2_piece_23 = chamfer2_piece_23a & chamfer2_piece_23b
    add(chamfer2_piece_23, mode=Mode.SUBTRACT)
    with BuildSketch(Plane(origin=(135.81835448, -57, 80.68154552), x_dir=(0.01944252080601719, 0.9996219169112965, 0.01944252080601719), z_dir=(-0.7071067811865476, 0, 0.7071067811865476))) as chamfer2_piece_24a_section:
        with BuildLine():
            Line((1.028673195, 0), (-0.056547155, 1.027117794))
            Line((-0.056547155, 1.027117794), (-0.076539593, 1.026567876))
            ThreePointArc((-0.076539593, 1.026567876), (-0.034129227, 0.51339783), (-0.019992438, -0.000549918))
            Line((-0.019992438, -0.000549918), (0.000549918, -0.019992438))
            ThreePointArc((0.000549918, -0.019992438), (0.514497665, -0.00585565), (1.029223113, -0.019992438))
            Line((1.029223113, -0.019992438), (1.028673195, 0))
        make_face()
    chamfer2_piece_24a = extrude(amount=13.628505929, mode=Mode.PRIVATE)
    chamfer2_piece_24a = split(chamfer2_piece_24a, bisect_by=Plane(origin=(128, -56.681906875, 89.036114365), z_dir=(-1, 0, 0)), keep=Keep.TOP, mode=Mode.PRIVATE)
    with BuildSketch(Plane(origin=(128, -57, 85.928217012), x_dir=(0.027495876610582105, 0.999621916911297, 0), z_dir=(0, 0, 1))) as chamfer2_piece_24b_section:
        with BuildLine():
            Line((1.028673195, 0), (-0.056547155, 1.027117794))
            Line((-0.056547155, 1.027117794), (-0.076539593, 1.026567876))
            ThreePointArc((-0.076539593, 1.026567876), (-0.034129227, 0.51339783), (-0.019992438, -0.000549918))
            Line((-0.019992438, -0.000549918), (0.000549918, -0.019992438))
            ThreePointArc((0.000549918, -0.019992438), (0.514497665, -0.00585565), (1.029223113, -0.019992438))
            Line((1.029223113, -0.019992438), (1.028673195, 0))
        make_face()
    chamfer2_piece_24b = extrude(amount=113.143565976, mode=Mode.PRIVATE)
    chamfer2_piece_24b = split(chamfer2_piece_24b, bisect_by=Plane(origin=(128.379160813, -56.681906875, 88.120739187), z_dir=(-0.7071067811865476, 0, -0.7071067811865476)), keep=Keep.TOP, mode=Mode.PRIVATE)
    chamfer2_piece_24 = chamfer2_piece_24a & chamfer2_piece_24b
    add(chamfer2_piece_24, mode=Mode.SUBTRACT)
    with BuildSketch(Plane(origin=(128, -57, 85.928217012), x_dir=(0.027495876610582105, 0.999621916911297, 0), z_dir=(0, 0, 1))) as chamfer2_piece_25a_section:
        with BuildLine():
            Line((1.028673195, 0), (-0.056547155, 1.027117794))
            Line((-0.056547155, 1.027117794), (-0.076539593, 1.026567876))
            ThreePointArc((-0.076539593, 1.026567876), (-0.034129227, 0.51339783), (-0.019992438, -0.000549918))
            Line((-0.019992438, -0.000549918), (0.000549918, -0.019992438))
            ThreePointArc((0.000549918, -0.019992438), (0.514497665, -0.00585565), (1.029223113, -0.019992438))
            Line((1.029223113, -0.019992438), (1.028673195, 0))
        make_face()
    chamfer2_piece_25a = extrude(amount=113.143565976, mode=Mode.PRIVATE)
    chamfer2_piece_25a = split(chamfer2_piece_25a, bisect_by=Plane(origin=(128.379160813, -56.681906875, 196.879260813), z_dir=(-0.7071067811865476, 0, 0.7071067811865476)), keep=Keep.TOP, mode=Mode.PRIVATE)
    with BuildSketch(Plane(origin=(126.18154552, -57, 194.68164552), x_dir=(-0.7068394360706735, -0.027495876610588745, 0.7068394360706735), z_dir=(0.7071067811865476, 0, 0.7071067811865476))) as chamfer2_piece_25b_section:
        with BuildLine():
            Line((1.028673195, 0), (-0.056547155, -1.027117794))
            Line((-0.056547155, -1.027117794), (-0.076539593, -1.026567876))
            ThreePointArc((-0.076539593, -1.026567876), (-0.034129227, -0.51339783), (-0.019992438, 0.000549918))
            Line((-0.019992438, 0.000549918), (0.000549918, 0.019992438))
            ThreePointArc((0.000549918, 0.019992438), (0.514497665, 0.00585565), (1.029223113, 0.019992438))
            Line((1.029223113, 0.019992438), (1.028673195, 0))
        make_face()
    chamfer2_piece_25b = extrude(amount=13.628505929, mode=Mode.PRIVATE)
    chamfer2_piece_25b = split(chamfer2_piece_25b, bisect_by=Plane(origin=(128, -56.681906875, 195.963885635), z_dir=(-1, 0, 0)), keep=Keep.TOP, mode=Mode.PRIVATE)
    chamfer2_piece_25 = chamfer2_piece_25a & chamfer2_piece_25b
    add(chamfer2_piece_25, mode=Mode.SUBTRACT)
    with BuildSketch(Plane(origin=(6, 57, 199.071782988), x_dir=(0.9996219169112968, 0.027495876610589075, 0), z_dir=(0, 0, -1))) as chamfer2_piece_26a_section:
        with BuildLine():
            Line((1.028673195, 0), (-0.056547155, 1.027117794))
            Line((-0.056547155, 1.027117794), (-0.076539593, 1.026567876))
            ThreePointArc((-0.076539593, 1.026567876), (-0.034129227, 0.51339783), (-0.019992438, -0.000549918))
            Line((-0.019992438, -0.000549918), (0.000549918, -0.019992438))
            ThreePointArc((0.000549918, -0.019992438), (0.514497665, -0.00585565), (1.029223113, -0.019992438))
            Line((1.029223113, -0.019992438), (1.028673195, 0))
        make_face()
    chamfer2_piece_26a = extrude(amount=113.143565976, mode=Mode.PRIVATE)
    chamfer2_piece_26a = split(chamfer2_piece_26a, bisect_by=Plane(origin=(5.620839187, 56.681906875, 196.879260813), z_dir=(0.7071067811865472, 0, 0.7071067811865478)), keep=Keep.TOP, mode=Mode.PRIVATE)
    with BuildSketch(Plane(origin=(-1.81835448, 57, 204.31845448), x_dir=(0.7068394360706731, 0.027495876610588672, 0.7068394360706738), z_dir=(0.7071067811865479, 0, -0.7071067811865474))) as chamfer2_piece_26b_section:
        with BuildLine():
            Line((1.028673195, 0), (-0.056547155, 1.027117794))
            Line((-0.056547155, 1.027117794), (-0.076539593, 1.026567876))
            ThreePointArc((-0.076539593, 1.026567876), (-0.034129227, 0.51339783), (-0.019992438, -0.000549918))
            Line((-0.019992438, -0.000549918), (0.000549918, -0.019992438))
            ThreePointArc((0.000549918, -0.019992438), (0.514497665, -0.00585565), (1.029223113, -0.019992438))
            Line((1.029223113, -0.019992438), (1.028673195, 0))
        make_face()
    chamfer2_piece_26b = extrude(amount=13.628505929, mode=Mode.PRIVATE)
    chamfer2_piece_26b = split(chamfer2_piece_26b, bisect_by=Plane(origin=(6, 56.681906875, 195.963885635), z_dir=(1, 0, 0)), keep=Keep.TOP, mode=Mode.PRIVATE)
    chamfer2_piece_26 = chamfer2_piece_26a & chamfer2_piece_26b
    add(chamfer2_piece_26, mode=Mode.SUBTRACT)
    with BuildSketch(Plane(origin=(7.81845448, 57, 90.31835448), x_dir=(0.7068394360706733, 0.027495876610588946, -0.7068394360706736), z_dir=(-0.7071067811865477, 0, -0.7071067811865475))) as chamfer2_piece_27a_section:
        with BuildLine():
            Line((1.028673195, 0), (-0.056547155, 1.027117794))
            Line((-0.056547155, 1.027117794), (-0.076539593, 1.026567876))
            ThreePointArc((-0.076539593, 1.026567876), (-0.034129227, 0.51339783), (-0.019992438, -0.000549918))
            Line((-0.019992438, -0.000549918), (0.000549918, -0.019992438))
            ThreePointArc((0.000549918, -0.019992438), (0.514497665, -0.00585565), (1.029223113, -0.019992438))
            Line((1.029223113, -0.019992438), (1.028673195, 0))
        make_face()
    chamfer2_piece_27a = extrude(amount=13.628505929, mode=Mode.PRIVATE)
    chamfer2_piece_27a = split(chamfer2_piece_27a, bisect_by=Plane(origin=(6, 56.681906875, 89.036114365), z_dir=(1, 0, 0)), keep=Keep.TOP, mode=Mode.PRIVATE)
    with BuildSketch(Plane(origin=(6, 57, 199.071782988), x_dir=(0.9996219169112968, 0.027495876610589075, 0), z_dir=(0, 0, -1))) as chamfer2_piece_27b_section:
        with BuildLine():
            Line((1.028673195, 0), (-0.056547155, 1.027117794))
            Line((-0.056547155, 1.027117794), (-0.076539593, 1.026567876))
            ThreePointArc((-0.076539593, 1.026567876), (-0.034129227, 0.51339783), (-0.019992438, -0.000549918))
            Line((-0.019992438, -0.000549918), (0.000549918, -0.019992438))
            ThreePointArc((0.000549918, -0.019992438), (0.514497665, -0.00585565), (1.029223113, -0.019992438))
            Line((1.029223113, -0.019992438), (1.028673195, 0))
        make_face()
    chamfer2_piece_27b = extrude(amount=113.143565976, mode=Mode.PRIVATE)
    chamfer2_piece_27b = split(chamfer2_piece_27b, bisect_by=Plane(origin=(5.620839187, 56.681906875, 88.120739187), z_dir=(0.7071067811865475, 0, -0.7071067811865477)), keep=Keep.TOP, mode=Mode.PRIVATE)
    chamfer2_piece_27 = chamfer2_piece_27a & chamfer2_piece_27b
    add(chamfer2_piece_27, mode=Mode.SUBTRACT)
    with BuildSketch(Plane(origin=(128, 57, 199.071782988), x_dir=(-0.9996219169112968, 0.027495876610589196, 0), z_dir=(0, 0, -1))) as chamfer2_piece_28a_section:
        with BuildLine():
            Line((1.028673195, 0), (-0.056547155, -1.027117794))
            Line((-0.056547155, -1.027117794), (-0.076539593, -1.026567876))
            ThreePointArc((-0.076539593, -1.026567876), (-0.034129227, -0.51339783), (-0.019992438, 0.000549918))
            Line((-0.019992438, 0.000549918), (0.000549918, 0.019992438))
            ThreePointArc((0.000549918, 0.019992438), (0.514497665, 0.00585565), (1.029223113, 0.019992438))
            Line((1.029223113, 0.019992438), (1.028673195, 0))
        make_face()
    chamfer2_piece_28a = extrude(amount=113.143565976, mode=Mode.PRIVATE)
    chamfer2_piece_28a = split(chamfer2_piece_28a, bisect_by=Plane(origin=(128.379160813, 56.681906875, 196.879260813), z_dir=(-0.7071067811865476, 0, 0.7071067811865476)), keep=Keep.TOP, mode=Mode.PRIVATE)
    with BuildSketch(Plane(origin=(126.18154552, 57, 194.68164552), x_dir=(-0.7068394360706735, 0.027495876610588745, 0.7068394360706735), z_dir=(0.7071067811865476, 0, 0.7071067811865476))) as chamfer2_piece_28b_section:
        with BuildLine():
            Line((1.028673195, 0), (-0.056547155, 1.027117794))
            Line((-0.056547155, 1.027117794), (-0.076539593, 1.026567876))
            ThreePointArc((-0.076539593, 1.026567876), (-0.034129227, 0.51339783), (-0.019992438, -0.000549918))
            Line((-0.019992438, -0.000549918), (0.000549918, -0.019992438))
            ThreePointArc((0.000549918, -0.019992438), (0.514497665, -0.00585565), (1.029223113, -0.019992438))
            Line((1.029223113, -0.019992438), (1.028673195, 0))
        make_face()
    chamfer2_piece_28b = extrude(amount=13.628505929, mode=Mode.PRIVATE)
    chamfer2_piece_28b = split(chamfer2_piece_28b, bisect_by=Plane(origin=(128, 56.681906875, 195.963885635), z_dir=(-1, 0, 0)), keep=Keep.TOP, mode=Mode.PRIVATE)
    chamfer2_piece_28 = chamfer2_piece_28a & chamfer2_piece_28b
    add(chamfer2_piece_28, mode=Mode.SUBTRACT)
    with BuildSketch(Plane(origin=(135.81835448, 57, 80.68154552), x_dir=(0.01944252080601719, -0.9996219169112965, 0.01944252080601719), z_dir=(-0.7071067811865476, 0, 0.7071067811865476))) as chamfer2_piece_29a_section:
        with BuildLine():
            Line((1.028673195, 0), (-0.056547155, -1.027117794))
            Line((-0.056547155, -1.027117794), (-0.076539593, -1.026567876))
            ThreePointArc((-0.076539593, -1.026567876), (-0.034129227, -0.51339783), (-0.019992438, 0.000549918))
            Line((-0.019992438, 0.000549918), (0.000549918, 0.019992438))
            ThreePointArc((0.000549918, 0.019992438), (0.514497665, 0.00585565), (1.029223113, 0.019992438))
            Line((1.029223113, 0.019992438), (1.028673195, 0))
        make_face()
    chamfer2_piece_29a = extrude(amount=13.628505929, mode=Mode.PRIVATE)
    chamfer2_piece_29a = split(chamfer2_piece_29a, bisect_by=Plane(origin=(128, 56.681906875, 89.036114365), z_dir=(-1, 0, 0)), keep=Keep.TOP, mode=Mode.PRIVATE)
    with BuildSketch(Plane(origin=(128, 57, 199.071782988), x_dir=(-0.9996219169112968, 0.027495876610589196, 0), z_dir=(0, 0, -1))) as chamfer2_piece_29b_section:
        with BuildLine():
            Line((1.028673195, 0), (-0.056547155, -1.027117794))
            Line((-0.056547155, -1.027117794), (-0.076539593, -1.026567876))
            ThreePointArc((-0.076539593, -1.026567876), (-0.034129227, -0.51339783), (-0.019992438, 0.000549918))
            Line((-0.019992438, 0.000549918), (0.000549918, 0.019992438))
            ThreePointArc((0.000549918, 0.019992438), (0.514497665, 0.00585565), (1.029223113, 0.019992438))
            Line((1.029223113, 0.019992438), (1.028673195, 0))
        make_face()
    chamfer2_piece_29b = extrude(amount=113.143565976, mode=Mode.PRIVATE)
    chamfer2_piece_29b = split(chamfer2_piece_29b, bisect_by=Plane(origin=(128.379160813, 56.681906875, 88.120739187), z_dir=(-0.7071067811865476, 0, -0.7071067811865476)), keep=Keep.TOP, mode=Mode.PRIVATE)
    chamfer2_piece_29 = chamfer2_piece_29a & chamfer2_piece_29b
    add(chamfer2_piece_29, mode=Mode.SUBTRACT)

    # Chamfer3
    chamfer3_edges = [part_1.edges().sort_by_distance(p)[0] for p in [
        (134, 15.5, 221.3),
        (134, 15.5, 71.3),
        (0, 15.5, 221.3),
        (0, 15.5, 71.3),
        (134, -15.5, 221.3),
        (134, -15.5, 71.3),
        (0, -15.5, 221.3),
        (0, -15.5, 71.3),
    ]]
    chamfer(chamfer3_edges, length=CHAMFER3_SIZE)

    # Sketch11 → Cut-Extrude9 (cut, through all)
    with BuildSketch(Plane(origin=(0, 57, 0), x_dir=(1, 0, 0), z_dir=(0, 1, 0))):
        Polygon((128, -88.5), (128, -56), (124.5, -56), (124.5, -225), (128, -225), (128, -196.5), (134, -196.5), (134, -250), (0, -250), (0, 0), (134, 0), (134, -88.5), align=None)
    extrude(amount=-CUT_EXTRUDE9_DEPTH, mode=Mode.SUBTRACT)

    # Chamfer4
    chamfer4_edges = [part_1.edges().sort_by_distance(p)[0] for p in [
        (124.5, 57, 140.5),
        (124.5, -57, 140.5),
    ]]
    chamfer(chamfer4_edges, length=CHAMFER4_SIZE)

    # Sketch12 → Boss-Extrude3 (add)
    with BuildSketch(Plane(origin=(0, 57, 0), x_dir=(1, 0, 0), z_dir=(0, 1, 0))):
        with Locations((124.75, -57)):
            Rectangle(SKETCH12_W, SKETCH12_H)
    extrude(amount=-BOSS_EXTRUDE3_DEPTH)

    # Chamfer5
    chamfer5_edges = [part_1.edges().sort_by_distance(p)[0] for p in [
        (124.75, 57, 58),
        (124.75, -57, 58),
    ]]
    chamfer(chamfer5_edges, length=CHAMFER5_SIZE - 0.0001)  # a hair under: the kernel refuses the full size


solid = part_1.part
